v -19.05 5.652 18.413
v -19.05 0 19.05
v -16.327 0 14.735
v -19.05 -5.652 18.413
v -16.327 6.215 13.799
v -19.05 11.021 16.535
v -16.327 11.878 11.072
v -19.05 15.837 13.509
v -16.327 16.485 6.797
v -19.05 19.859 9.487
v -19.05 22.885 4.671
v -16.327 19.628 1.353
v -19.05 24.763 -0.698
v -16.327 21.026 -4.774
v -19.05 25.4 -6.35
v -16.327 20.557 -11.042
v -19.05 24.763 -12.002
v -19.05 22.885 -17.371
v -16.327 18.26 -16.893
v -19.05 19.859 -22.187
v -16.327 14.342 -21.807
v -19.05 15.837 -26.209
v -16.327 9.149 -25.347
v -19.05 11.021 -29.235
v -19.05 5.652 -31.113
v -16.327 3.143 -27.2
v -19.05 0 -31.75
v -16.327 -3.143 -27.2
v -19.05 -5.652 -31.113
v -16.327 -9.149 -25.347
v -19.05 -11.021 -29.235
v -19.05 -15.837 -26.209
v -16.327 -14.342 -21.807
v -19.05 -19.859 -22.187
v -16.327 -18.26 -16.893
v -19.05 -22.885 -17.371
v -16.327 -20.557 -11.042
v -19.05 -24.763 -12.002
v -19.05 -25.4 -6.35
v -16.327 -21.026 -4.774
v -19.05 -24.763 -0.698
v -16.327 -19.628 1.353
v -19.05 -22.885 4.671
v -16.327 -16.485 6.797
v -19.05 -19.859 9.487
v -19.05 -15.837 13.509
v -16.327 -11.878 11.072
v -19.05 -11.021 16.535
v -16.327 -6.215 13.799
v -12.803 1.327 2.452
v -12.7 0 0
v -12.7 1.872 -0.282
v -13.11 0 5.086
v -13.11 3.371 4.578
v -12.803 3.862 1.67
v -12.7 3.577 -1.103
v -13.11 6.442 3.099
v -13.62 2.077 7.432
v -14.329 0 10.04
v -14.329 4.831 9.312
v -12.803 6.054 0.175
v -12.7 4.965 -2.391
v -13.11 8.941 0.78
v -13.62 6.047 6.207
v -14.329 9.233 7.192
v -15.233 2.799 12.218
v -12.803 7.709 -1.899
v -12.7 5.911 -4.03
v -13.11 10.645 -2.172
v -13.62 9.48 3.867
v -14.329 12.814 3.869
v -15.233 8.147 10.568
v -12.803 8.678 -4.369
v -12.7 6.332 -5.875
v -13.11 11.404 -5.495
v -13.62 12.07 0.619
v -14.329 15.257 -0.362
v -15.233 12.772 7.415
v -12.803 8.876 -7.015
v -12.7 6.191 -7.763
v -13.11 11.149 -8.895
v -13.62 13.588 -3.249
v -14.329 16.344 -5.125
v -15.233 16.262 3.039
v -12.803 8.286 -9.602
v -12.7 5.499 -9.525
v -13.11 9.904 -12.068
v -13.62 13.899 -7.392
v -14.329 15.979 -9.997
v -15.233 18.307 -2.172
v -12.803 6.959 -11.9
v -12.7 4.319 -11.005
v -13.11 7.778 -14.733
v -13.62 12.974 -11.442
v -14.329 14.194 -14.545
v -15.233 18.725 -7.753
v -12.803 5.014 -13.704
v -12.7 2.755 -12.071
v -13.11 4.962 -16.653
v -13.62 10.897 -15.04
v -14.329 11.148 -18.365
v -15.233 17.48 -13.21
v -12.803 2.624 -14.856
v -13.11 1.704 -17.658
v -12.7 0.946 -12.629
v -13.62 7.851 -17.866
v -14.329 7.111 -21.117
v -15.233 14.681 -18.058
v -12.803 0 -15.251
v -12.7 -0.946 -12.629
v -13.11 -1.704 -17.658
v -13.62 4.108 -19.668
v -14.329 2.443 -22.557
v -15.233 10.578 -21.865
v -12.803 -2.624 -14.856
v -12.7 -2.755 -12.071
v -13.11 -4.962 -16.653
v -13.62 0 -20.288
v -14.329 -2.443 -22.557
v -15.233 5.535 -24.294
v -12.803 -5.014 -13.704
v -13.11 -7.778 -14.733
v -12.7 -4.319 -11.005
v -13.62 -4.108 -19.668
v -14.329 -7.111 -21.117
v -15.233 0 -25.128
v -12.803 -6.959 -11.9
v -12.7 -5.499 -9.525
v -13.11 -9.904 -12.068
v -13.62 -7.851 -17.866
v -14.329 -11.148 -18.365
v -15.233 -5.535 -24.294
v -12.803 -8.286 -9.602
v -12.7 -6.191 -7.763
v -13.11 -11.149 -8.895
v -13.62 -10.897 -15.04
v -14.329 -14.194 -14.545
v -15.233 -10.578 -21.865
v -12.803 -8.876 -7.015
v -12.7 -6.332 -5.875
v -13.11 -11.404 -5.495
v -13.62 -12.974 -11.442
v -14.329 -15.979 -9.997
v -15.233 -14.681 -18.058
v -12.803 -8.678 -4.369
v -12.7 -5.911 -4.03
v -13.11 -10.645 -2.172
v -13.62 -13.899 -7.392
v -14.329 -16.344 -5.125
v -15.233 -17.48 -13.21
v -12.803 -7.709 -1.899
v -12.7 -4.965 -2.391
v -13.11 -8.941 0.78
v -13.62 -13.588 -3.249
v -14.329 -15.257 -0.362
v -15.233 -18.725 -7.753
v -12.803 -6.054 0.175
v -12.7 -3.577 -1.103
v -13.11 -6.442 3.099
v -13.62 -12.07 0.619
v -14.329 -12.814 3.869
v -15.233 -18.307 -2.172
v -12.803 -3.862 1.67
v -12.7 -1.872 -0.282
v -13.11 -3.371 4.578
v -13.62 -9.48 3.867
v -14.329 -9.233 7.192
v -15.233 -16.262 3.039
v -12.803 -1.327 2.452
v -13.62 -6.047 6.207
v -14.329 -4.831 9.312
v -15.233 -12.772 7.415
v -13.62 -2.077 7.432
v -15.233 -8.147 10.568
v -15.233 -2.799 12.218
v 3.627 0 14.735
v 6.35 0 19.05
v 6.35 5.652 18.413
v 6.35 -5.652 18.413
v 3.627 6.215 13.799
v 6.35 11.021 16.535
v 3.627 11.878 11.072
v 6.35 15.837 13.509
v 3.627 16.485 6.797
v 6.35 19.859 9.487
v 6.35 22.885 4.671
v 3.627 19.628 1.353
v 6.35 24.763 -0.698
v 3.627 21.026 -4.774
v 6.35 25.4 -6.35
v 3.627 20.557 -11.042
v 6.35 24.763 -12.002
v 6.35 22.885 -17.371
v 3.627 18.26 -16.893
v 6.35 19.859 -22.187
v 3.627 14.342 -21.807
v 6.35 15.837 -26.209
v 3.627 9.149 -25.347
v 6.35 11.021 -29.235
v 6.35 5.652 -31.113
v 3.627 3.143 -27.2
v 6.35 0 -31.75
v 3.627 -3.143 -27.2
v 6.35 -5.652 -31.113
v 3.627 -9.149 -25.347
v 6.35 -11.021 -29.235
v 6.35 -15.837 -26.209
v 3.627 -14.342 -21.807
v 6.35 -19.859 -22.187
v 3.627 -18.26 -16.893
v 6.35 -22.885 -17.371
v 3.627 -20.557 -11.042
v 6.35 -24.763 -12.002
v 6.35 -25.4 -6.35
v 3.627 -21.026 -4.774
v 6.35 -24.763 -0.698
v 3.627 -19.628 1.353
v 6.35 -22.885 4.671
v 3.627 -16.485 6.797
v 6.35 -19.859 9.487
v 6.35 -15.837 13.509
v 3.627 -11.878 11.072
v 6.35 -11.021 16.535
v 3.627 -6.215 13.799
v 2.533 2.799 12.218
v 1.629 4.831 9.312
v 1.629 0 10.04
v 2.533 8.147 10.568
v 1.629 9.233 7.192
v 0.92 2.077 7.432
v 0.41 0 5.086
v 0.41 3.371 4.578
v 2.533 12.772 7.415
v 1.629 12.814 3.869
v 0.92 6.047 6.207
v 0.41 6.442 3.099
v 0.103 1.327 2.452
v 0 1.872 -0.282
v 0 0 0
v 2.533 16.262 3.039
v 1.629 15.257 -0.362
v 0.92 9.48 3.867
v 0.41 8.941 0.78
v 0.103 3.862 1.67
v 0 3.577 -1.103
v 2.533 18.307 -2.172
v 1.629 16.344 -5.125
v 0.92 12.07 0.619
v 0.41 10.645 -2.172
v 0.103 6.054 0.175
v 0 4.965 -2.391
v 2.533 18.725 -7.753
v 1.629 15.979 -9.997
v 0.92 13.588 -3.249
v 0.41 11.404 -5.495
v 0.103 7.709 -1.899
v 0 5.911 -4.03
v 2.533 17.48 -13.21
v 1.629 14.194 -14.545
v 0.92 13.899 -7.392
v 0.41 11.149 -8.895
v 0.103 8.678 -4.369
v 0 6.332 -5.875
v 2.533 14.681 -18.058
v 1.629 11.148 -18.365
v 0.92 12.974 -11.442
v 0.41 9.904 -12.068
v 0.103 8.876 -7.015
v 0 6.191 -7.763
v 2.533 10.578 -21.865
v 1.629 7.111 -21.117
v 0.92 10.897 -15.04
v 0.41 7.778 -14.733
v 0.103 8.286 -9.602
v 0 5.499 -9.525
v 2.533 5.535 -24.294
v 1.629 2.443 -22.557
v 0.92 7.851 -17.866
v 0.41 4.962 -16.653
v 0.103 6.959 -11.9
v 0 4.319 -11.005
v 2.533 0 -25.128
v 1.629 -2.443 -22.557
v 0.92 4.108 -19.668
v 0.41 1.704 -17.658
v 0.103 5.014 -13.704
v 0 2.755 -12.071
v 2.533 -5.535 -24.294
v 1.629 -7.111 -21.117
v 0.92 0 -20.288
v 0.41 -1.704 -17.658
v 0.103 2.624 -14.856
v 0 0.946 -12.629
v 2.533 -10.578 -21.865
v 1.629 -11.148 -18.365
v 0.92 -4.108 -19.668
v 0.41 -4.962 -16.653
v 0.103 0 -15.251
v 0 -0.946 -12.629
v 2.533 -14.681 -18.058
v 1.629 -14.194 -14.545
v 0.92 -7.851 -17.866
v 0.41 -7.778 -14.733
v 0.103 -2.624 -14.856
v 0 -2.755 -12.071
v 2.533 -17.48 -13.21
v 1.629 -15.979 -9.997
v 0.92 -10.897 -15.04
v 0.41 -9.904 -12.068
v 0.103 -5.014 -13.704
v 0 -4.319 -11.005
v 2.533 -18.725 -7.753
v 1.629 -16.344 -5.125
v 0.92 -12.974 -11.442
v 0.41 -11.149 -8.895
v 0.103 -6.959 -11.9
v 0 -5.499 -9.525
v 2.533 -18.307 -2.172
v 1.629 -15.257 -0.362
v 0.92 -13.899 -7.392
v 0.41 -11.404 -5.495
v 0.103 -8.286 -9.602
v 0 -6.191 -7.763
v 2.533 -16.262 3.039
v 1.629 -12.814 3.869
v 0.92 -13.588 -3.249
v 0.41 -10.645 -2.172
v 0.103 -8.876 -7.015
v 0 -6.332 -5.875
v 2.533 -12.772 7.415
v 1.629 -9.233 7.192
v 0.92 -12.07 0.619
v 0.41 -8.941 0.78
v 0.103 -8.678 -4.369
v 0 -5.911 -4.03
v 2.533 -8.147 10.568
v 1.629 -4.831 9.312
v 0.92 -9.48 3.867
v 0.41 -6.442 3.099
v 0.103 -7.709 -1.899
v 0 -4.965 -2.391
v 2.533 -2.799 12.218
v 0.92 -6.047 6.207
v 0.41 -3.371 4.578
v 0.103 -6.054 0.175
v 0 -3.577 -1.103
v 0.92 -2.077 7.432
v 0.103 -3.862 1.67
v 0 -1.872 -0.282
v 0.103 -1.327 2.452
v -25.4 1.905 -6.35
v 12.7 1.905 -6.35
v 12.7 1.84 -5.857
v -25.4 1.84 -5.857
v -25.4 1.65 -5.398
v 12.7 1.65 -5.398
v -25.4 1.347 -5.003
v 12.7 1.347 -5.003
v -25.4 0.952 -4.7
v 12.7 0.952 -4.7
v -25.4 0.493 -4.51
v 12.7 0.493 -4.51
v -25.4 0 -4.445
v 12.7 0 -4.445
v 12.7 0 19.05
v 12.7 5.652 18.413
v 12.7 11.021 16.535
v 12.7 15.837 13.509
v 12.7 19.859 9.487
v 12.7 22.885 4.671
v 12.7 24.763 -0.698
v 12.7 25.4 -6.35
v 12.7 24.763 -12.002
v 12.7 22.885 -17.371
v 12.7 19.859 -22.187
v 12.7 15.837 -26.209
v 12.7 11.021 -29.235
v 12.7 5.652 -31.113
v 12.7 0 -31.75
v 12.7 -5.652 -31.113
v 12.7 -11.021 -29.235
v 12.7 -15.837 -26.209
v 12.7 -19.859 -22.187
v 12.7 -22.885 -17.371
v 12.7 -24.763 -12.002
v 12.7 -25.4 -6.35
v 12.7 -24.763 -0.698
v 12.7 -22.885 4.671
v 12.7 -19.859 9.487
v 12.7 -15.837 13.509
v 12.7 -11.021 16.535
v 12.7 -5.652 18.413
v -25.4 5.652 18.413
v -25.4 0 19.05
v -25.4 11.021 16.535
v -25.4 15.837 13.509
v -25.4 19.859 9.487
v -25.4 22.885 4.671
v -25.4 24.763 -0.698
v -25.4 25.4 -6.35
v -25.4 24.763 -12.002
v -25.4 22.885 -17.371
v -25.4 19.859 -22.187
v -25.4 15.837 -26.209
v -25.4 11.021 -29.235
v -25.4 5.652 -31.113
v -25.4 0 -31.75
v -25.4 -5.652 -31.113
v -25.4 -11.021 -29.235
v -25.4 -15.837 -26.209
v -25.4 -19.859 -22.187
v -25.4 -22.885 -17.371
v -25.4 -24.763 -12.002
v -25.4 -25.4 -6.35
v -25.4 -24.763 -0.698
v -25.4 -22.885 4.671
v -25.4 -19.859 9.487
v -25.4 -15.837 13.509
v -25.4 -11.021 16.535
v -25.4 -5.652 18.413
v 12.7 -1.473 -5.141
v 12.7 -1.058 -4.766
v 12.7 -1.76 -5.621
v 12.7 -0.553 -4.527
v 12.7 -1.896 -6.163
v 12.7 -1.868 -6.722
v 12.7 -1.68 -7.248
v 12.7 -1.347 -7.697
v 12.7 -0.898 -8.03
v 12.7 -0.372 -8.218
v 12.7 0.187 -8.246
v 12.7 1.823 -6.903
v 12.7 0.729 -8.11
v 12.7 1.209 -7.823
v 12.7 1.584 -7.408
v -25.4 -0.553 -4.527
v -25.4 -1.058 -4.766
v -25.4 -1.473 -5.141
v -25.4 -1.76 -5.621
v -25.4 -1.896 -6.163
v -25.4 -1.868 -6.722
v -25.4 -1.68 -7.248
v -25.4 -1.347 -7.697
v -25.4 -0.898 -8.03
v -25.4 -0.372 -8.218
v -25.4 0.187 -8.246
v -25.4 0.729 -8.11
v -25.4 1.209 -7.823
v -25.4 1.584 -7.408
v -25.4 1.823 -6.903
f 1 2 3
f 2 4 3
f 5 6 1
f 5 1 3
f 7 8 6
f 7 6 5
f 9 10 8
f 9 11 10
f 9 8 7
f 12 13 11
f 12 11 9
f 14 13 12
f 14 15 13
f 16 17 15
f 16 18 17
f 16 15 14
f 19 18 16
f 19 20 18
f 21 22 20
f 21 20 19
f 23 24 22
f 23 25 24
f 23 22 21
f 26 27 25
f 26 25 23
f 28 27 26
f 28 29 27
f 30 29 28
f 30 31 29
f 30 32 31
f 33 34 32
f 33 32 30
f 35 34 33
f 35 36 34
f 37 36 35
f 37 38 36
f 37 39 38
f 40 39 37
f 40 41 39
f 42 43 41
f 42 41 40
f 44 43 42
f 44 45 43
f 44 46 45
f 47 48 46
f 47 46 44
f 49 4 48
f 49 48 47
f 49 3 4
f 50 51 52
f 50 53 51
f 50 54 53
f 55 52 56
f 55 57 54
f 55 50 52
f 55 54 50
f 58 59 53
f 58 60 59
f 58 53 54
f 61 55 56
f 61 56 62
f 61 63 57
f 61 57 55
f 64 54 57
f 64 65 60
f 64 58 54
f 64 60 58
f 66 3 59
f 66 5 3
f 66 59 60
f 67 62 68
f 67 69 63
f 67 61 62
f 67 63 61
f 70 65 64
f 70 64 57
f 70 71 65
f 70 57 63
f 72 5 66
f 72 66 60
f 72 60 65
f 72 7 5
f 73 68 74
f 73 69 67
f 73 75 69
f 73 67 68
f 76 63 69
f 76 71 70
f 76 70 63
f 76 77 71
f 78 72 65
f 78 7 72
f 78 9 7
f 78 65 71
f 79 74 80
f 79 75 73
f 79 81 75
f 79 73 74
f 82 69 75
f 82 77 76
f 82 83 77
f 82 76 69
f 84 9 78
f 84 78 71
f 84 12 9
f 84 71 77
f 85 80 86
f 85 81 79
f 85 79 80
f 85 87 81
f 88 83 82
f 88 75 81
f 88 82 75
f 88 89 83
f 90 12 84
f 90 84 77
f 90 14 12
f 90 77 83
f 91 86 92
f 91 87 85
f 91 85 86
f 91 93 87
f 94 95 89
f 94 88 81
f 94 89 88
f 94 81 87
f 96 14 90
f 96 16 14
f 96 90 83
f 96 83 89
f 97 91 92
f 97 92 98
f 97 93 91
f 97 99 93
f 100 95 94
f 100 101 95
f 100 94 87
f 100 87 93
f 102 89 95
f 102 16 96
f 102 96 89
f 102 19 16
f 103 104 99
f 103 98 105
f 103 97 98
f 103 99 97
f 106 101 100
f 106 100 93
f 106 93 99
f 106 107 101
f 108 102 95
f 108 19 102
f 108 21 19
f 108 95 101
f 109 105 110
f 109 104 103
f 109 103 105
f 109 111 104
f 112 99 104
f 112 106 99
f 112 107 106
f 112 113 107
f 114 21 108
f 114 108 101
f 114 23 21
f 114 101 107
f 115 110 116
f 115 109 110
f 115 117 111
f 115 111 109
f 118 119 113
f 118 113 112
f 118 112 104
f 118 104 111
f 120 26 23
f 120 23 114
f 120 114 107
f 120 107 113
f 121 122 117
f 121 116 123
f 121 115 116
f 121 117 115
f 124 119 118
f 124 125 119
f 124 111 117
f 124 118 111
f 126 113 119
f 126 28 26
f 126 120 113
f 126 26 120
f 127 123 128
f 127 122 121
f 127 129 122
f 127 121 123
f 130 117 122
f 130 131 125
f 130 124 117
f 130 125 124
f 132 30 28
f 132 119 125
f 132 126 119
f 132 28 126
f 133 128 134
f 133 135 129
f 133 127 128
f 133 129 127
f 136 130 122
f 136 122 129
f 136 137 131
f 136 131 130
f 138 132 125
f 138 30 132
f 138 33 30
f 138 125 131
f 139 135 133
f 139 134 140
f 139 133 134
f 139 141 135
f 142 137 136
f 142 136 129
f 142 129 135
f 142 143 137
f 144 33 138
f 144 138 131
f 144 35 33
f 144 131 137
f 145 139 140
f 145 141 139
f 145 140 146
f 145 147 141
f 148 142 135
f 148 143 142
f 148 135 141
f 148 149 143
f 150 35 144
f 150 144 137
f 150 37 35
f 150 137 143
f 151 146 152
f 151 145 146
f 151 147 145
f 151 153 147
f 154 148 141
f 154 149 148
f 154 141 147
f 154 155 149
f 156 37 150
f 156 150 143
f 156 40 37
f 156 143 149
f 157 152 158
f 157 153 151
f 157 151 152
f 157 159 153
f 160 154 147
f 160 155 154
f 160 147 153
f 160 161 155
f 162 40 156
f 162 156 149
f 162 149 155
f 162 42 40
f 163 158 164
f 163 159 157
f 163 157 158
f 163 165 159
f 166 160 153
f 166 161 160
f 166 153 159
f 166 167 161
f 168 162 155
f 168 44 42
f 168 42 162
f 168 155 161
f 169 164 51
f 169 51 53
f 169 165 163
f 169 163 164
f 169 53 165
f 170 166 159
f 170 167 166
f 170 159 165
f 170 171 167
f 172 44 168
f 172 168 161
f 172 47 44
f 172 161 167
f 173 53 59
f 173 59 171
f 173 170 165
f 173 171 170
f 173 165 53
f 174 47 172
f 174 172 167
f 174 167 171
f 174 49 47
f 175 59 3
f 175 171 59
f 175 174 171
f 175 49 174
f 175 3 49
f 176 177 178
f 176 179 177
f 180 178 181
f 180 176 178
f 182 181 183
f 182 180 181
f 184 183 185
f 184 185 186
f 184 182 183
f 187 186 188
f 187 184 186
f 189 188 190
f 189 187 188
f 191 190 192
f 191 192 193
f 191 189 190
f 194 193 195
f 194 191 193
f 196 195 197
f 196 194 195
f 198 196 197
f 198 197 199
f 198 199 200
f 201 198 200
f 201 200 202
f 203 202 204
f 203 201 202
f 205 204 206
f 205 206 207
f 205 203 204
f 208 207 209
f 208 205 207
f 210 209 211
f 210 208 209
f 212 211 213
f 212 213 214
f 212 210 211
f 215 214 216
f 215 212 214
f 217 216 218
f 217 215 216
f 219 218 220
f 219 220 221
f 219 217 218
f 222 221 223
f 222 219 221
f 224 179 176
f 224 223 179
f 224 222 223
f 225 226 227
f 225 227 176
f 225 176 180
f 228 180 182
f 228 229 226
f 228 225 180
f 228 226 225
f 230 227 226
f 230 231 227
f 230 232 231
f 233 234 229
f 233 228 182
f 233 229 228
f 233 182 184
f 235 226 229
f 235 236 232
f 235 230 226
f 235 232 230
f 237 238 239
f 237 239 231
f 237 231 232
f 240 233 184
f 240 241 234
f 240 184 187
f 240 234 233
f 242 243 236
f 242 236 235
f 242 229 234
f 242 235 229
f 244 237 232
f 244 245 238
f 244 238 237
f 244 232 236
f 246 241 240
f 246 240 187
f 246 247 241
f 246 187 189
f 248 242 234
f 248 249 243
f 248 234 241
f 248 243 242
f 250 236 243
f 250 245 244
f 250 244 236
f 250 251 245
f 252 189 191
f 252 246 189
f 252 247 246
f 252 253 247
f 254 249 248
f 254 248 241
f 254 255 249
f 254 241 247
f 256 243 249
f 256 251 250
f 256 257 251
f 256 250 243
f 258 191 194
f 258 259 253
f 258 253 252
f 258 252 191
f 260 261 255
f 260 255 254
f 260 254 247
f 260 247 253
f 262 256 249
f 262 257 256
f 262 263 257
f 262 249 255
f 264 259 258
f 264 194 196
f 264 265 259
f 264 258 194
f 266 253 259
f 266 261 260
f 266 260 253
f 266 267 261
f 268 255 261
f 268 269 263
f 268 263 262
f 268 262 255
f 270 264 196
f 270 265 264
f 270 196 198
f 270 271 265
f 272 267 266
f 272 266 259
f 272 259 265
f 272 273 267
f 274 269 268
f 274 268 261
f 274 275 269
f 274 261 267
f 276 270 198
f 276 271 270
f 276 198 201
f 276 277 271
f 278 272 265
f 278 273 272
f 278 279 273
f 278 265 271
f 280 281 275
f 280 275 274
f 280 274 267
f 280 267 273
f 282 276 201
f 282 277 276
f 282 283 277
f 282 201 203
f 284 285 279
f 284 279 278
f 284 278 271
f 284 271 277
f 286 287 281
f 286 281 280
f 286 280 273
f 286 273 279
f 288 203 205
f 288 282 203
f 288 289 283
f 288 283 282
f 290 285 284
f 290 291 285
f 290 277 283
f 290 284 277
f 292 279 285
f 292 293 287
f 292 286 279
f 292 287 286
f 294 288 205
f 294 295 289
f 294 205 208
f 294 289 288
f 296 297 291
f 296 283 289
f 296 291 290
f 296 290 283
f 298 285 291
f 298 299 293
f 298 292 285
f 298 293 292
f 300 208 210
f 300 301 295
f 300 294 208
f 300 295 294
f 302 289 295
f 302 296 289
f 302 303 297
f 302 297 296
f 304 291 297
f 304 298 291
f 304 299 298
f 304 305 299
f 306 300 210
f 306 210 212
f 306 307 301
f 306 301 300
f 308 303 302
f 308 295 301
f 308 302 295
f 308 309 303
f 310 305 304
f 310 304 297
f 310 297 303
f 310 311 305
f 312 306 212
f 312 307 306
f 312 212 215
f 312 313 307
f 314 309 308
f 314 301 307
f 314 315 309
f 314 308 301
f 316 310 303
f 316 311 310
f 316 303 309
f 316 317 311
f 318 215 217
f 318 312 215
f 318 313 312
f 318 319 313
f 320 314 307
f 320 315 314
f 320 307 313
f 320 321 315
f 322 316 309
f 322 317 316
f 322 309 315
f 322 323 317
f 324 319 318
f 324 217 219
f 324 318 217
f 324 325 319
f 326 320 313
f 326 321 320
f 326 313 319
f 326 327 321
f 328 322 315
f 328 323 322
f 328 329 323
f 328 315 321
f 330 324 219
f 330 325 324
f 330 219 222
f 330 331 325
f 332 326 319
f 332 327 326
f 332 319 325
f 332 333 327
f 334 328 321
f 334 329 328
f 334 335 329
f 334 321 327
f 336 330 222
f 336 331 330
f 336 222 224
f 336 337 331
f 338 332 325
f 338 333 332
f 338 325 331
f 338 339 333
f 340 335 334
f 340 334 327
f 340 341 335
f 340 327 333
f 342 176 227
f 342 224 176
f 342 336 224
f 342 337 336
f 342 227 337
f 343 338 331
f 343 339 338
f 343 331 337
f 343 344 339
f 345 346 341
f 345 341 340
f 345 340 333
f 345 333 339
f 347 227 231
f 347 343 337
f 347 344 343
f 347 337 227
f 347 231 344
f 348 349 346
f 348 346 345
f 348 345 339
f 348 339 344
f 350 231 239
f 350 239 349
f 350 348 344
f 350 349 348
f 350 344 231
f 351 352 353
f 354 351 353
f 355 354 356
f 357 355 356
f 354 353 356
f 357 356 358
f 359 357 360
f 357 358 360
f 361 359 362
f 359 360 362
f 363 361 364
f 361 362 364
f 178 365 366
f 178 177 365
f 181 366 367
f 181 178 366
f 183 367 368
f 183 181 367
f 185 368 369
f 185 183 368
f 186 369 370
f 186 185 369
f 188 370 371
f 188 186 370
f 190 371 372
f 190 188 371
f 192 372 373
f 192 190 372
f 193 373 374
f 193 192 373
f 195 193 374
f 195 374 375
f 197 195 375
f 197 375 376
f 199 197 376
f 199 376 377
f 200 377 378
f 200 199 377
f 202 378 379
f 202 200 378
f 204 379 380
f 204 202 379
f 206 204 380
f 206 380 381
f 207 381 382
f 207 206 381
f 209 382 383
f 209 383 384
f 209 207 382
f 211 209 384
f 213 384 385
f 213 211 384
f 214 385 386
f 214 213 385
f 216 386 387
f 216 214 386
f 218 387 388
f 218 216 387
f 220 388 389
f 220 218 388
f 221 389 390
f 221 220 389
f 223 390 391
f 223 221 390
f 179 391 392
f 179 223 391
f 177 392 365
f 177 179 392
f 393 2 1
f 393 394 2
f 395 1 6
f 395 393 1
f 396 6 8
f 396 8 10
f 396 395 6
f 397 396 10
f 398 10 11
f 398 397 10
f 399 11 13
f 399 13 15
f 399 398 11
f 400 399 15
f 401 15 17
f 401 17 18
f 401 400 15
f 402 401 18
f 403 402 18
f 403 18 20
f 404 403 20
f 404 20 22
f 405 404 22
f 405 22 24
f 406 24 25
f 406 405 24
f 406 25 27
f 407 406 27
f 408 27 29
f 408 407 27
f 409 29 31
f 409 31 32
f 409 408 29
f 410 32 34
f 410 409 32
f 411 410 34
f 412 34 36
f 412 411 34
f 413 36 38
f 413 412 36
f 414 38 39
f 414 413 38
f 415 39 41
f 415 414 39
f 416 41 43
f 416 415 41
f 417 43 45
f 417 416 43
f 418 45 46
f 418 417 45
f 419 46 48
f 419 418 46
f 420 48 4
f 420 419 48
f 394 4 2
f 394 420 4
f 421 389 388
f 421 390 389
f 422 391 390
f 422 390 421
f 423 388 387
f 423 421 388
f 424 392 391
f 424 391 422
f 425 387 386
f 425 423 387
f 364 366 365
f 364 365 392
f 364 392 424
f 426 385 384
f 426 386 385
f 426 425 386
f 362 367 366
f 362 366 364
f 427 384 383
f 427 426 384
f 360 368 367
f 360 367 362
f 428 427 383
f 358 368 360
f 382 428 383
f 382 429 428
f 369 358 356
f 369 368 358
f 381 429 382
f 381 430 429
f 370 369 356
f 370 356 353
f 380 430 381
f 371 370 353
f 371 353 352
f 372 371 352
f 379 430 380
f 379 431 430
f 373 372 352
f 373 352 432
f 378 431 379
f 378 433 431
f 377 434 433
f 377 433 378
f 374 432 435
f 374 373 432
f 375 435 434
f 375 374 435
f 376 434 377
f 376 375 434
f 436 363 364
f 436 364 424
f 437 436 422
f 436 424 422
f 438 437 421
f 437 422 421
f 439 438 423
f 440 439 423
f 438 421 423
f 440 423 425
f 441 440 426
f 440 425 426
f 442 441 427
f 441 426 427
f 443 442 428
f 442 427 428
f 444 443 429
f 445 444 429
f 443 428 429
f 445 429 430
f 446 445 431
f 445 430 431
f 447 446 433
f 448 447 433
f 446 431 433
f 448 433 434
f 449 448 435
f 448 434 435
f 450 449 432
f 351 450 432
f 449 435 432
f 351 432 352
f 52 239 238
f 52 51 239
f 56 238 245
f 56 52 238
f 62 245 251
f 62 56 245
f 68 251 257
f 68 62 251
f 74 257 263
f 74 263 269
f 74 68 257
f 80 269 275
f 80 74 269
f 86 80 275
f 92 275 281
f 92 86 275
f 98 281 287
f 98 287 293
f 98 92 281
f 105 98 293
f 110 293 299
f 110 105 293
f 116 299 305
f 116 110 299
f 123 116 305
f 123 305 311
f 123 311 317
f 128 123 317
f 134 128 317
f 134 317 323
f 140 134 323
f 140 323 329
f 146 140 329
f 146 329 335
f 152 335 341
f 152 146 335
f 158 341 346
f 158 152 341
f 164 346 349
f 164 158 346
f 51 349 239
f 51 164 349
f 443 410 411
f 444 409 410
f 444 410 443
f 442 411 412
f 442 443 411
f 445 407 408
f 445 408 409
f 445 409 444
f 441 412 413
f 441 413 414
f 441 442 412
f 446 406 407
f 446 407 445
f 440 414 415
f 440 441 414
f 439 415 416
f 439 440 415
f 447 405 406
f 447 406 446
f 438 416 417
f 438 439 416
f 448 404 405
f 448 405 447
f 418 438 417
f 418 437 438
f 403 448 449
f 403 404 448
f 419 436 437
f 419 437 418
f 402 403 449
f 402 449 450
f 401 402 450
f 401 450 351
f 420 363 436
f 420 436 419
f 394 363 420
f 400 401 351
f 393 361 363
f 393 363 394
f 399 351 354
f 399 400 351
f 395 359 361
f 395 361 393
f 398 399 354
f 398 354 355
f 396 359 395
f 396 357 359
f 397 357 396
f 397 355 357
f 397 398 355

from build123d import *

# Parameters (mm, degrees)
F3_DEPTH = 101.6


with BuildPart() as f1:
    # F0 (on Front) → F1 (revolve)
    with BuildSketch(Plane.XZ):
        with BuildLine():
            ThreePointArc((6.35, 19.05), (1.629305, 10.040232), (0, 0))
            Line((0, 0), (-12.7, 0))
            ThreePointArc((-12.7, 0), (-14.329305, 10.040232), (-19.05, 19.05))
            Line((-19.05, 19.05), (-25.4, 19.05))
            Line((-25.4, 19.05), (-25.4, -6.35))
            Line((-25.4, -6.35), (0, -6.35))
            Line((0, -6.35), (6.35, -6.35))
            Line((6.35, -6.35), (12.7, -6.35))
            Line((12.7, -6.35), (12.7, 19.05))
            Line((12.7, 19.05), (6.35, 19.05))
        make_face()
    revolve(axis=Axis((-6.35, 0, -6.35), (-1, 0, 0)))

    # F2 (on face) → F3 (cut)
    with BuildSketch(Plane.YZ.offset(12.7)):
        with BuildLine():
            Line((0, -6.35), (0, -4.445))
            ThreePointArc((0, -4.445), (-1.347038, -7.697038), (1.905, -6.35))
            Line((1.905, -6.35), (0, -6.35))
        make_face()
        with BuildLine():
            ThreePointArc((1.905, -6.35), (1.347038, -5.002962), (0, -4.445))
            Line((0, -4.445), (0, -6.35))
            Line((0, -6.35), (1.905, -6.35))
        make_face()
    extrude(amount=-F3_DEPTH, mode=Mode.SUBTRACT)


solid = f1.part
